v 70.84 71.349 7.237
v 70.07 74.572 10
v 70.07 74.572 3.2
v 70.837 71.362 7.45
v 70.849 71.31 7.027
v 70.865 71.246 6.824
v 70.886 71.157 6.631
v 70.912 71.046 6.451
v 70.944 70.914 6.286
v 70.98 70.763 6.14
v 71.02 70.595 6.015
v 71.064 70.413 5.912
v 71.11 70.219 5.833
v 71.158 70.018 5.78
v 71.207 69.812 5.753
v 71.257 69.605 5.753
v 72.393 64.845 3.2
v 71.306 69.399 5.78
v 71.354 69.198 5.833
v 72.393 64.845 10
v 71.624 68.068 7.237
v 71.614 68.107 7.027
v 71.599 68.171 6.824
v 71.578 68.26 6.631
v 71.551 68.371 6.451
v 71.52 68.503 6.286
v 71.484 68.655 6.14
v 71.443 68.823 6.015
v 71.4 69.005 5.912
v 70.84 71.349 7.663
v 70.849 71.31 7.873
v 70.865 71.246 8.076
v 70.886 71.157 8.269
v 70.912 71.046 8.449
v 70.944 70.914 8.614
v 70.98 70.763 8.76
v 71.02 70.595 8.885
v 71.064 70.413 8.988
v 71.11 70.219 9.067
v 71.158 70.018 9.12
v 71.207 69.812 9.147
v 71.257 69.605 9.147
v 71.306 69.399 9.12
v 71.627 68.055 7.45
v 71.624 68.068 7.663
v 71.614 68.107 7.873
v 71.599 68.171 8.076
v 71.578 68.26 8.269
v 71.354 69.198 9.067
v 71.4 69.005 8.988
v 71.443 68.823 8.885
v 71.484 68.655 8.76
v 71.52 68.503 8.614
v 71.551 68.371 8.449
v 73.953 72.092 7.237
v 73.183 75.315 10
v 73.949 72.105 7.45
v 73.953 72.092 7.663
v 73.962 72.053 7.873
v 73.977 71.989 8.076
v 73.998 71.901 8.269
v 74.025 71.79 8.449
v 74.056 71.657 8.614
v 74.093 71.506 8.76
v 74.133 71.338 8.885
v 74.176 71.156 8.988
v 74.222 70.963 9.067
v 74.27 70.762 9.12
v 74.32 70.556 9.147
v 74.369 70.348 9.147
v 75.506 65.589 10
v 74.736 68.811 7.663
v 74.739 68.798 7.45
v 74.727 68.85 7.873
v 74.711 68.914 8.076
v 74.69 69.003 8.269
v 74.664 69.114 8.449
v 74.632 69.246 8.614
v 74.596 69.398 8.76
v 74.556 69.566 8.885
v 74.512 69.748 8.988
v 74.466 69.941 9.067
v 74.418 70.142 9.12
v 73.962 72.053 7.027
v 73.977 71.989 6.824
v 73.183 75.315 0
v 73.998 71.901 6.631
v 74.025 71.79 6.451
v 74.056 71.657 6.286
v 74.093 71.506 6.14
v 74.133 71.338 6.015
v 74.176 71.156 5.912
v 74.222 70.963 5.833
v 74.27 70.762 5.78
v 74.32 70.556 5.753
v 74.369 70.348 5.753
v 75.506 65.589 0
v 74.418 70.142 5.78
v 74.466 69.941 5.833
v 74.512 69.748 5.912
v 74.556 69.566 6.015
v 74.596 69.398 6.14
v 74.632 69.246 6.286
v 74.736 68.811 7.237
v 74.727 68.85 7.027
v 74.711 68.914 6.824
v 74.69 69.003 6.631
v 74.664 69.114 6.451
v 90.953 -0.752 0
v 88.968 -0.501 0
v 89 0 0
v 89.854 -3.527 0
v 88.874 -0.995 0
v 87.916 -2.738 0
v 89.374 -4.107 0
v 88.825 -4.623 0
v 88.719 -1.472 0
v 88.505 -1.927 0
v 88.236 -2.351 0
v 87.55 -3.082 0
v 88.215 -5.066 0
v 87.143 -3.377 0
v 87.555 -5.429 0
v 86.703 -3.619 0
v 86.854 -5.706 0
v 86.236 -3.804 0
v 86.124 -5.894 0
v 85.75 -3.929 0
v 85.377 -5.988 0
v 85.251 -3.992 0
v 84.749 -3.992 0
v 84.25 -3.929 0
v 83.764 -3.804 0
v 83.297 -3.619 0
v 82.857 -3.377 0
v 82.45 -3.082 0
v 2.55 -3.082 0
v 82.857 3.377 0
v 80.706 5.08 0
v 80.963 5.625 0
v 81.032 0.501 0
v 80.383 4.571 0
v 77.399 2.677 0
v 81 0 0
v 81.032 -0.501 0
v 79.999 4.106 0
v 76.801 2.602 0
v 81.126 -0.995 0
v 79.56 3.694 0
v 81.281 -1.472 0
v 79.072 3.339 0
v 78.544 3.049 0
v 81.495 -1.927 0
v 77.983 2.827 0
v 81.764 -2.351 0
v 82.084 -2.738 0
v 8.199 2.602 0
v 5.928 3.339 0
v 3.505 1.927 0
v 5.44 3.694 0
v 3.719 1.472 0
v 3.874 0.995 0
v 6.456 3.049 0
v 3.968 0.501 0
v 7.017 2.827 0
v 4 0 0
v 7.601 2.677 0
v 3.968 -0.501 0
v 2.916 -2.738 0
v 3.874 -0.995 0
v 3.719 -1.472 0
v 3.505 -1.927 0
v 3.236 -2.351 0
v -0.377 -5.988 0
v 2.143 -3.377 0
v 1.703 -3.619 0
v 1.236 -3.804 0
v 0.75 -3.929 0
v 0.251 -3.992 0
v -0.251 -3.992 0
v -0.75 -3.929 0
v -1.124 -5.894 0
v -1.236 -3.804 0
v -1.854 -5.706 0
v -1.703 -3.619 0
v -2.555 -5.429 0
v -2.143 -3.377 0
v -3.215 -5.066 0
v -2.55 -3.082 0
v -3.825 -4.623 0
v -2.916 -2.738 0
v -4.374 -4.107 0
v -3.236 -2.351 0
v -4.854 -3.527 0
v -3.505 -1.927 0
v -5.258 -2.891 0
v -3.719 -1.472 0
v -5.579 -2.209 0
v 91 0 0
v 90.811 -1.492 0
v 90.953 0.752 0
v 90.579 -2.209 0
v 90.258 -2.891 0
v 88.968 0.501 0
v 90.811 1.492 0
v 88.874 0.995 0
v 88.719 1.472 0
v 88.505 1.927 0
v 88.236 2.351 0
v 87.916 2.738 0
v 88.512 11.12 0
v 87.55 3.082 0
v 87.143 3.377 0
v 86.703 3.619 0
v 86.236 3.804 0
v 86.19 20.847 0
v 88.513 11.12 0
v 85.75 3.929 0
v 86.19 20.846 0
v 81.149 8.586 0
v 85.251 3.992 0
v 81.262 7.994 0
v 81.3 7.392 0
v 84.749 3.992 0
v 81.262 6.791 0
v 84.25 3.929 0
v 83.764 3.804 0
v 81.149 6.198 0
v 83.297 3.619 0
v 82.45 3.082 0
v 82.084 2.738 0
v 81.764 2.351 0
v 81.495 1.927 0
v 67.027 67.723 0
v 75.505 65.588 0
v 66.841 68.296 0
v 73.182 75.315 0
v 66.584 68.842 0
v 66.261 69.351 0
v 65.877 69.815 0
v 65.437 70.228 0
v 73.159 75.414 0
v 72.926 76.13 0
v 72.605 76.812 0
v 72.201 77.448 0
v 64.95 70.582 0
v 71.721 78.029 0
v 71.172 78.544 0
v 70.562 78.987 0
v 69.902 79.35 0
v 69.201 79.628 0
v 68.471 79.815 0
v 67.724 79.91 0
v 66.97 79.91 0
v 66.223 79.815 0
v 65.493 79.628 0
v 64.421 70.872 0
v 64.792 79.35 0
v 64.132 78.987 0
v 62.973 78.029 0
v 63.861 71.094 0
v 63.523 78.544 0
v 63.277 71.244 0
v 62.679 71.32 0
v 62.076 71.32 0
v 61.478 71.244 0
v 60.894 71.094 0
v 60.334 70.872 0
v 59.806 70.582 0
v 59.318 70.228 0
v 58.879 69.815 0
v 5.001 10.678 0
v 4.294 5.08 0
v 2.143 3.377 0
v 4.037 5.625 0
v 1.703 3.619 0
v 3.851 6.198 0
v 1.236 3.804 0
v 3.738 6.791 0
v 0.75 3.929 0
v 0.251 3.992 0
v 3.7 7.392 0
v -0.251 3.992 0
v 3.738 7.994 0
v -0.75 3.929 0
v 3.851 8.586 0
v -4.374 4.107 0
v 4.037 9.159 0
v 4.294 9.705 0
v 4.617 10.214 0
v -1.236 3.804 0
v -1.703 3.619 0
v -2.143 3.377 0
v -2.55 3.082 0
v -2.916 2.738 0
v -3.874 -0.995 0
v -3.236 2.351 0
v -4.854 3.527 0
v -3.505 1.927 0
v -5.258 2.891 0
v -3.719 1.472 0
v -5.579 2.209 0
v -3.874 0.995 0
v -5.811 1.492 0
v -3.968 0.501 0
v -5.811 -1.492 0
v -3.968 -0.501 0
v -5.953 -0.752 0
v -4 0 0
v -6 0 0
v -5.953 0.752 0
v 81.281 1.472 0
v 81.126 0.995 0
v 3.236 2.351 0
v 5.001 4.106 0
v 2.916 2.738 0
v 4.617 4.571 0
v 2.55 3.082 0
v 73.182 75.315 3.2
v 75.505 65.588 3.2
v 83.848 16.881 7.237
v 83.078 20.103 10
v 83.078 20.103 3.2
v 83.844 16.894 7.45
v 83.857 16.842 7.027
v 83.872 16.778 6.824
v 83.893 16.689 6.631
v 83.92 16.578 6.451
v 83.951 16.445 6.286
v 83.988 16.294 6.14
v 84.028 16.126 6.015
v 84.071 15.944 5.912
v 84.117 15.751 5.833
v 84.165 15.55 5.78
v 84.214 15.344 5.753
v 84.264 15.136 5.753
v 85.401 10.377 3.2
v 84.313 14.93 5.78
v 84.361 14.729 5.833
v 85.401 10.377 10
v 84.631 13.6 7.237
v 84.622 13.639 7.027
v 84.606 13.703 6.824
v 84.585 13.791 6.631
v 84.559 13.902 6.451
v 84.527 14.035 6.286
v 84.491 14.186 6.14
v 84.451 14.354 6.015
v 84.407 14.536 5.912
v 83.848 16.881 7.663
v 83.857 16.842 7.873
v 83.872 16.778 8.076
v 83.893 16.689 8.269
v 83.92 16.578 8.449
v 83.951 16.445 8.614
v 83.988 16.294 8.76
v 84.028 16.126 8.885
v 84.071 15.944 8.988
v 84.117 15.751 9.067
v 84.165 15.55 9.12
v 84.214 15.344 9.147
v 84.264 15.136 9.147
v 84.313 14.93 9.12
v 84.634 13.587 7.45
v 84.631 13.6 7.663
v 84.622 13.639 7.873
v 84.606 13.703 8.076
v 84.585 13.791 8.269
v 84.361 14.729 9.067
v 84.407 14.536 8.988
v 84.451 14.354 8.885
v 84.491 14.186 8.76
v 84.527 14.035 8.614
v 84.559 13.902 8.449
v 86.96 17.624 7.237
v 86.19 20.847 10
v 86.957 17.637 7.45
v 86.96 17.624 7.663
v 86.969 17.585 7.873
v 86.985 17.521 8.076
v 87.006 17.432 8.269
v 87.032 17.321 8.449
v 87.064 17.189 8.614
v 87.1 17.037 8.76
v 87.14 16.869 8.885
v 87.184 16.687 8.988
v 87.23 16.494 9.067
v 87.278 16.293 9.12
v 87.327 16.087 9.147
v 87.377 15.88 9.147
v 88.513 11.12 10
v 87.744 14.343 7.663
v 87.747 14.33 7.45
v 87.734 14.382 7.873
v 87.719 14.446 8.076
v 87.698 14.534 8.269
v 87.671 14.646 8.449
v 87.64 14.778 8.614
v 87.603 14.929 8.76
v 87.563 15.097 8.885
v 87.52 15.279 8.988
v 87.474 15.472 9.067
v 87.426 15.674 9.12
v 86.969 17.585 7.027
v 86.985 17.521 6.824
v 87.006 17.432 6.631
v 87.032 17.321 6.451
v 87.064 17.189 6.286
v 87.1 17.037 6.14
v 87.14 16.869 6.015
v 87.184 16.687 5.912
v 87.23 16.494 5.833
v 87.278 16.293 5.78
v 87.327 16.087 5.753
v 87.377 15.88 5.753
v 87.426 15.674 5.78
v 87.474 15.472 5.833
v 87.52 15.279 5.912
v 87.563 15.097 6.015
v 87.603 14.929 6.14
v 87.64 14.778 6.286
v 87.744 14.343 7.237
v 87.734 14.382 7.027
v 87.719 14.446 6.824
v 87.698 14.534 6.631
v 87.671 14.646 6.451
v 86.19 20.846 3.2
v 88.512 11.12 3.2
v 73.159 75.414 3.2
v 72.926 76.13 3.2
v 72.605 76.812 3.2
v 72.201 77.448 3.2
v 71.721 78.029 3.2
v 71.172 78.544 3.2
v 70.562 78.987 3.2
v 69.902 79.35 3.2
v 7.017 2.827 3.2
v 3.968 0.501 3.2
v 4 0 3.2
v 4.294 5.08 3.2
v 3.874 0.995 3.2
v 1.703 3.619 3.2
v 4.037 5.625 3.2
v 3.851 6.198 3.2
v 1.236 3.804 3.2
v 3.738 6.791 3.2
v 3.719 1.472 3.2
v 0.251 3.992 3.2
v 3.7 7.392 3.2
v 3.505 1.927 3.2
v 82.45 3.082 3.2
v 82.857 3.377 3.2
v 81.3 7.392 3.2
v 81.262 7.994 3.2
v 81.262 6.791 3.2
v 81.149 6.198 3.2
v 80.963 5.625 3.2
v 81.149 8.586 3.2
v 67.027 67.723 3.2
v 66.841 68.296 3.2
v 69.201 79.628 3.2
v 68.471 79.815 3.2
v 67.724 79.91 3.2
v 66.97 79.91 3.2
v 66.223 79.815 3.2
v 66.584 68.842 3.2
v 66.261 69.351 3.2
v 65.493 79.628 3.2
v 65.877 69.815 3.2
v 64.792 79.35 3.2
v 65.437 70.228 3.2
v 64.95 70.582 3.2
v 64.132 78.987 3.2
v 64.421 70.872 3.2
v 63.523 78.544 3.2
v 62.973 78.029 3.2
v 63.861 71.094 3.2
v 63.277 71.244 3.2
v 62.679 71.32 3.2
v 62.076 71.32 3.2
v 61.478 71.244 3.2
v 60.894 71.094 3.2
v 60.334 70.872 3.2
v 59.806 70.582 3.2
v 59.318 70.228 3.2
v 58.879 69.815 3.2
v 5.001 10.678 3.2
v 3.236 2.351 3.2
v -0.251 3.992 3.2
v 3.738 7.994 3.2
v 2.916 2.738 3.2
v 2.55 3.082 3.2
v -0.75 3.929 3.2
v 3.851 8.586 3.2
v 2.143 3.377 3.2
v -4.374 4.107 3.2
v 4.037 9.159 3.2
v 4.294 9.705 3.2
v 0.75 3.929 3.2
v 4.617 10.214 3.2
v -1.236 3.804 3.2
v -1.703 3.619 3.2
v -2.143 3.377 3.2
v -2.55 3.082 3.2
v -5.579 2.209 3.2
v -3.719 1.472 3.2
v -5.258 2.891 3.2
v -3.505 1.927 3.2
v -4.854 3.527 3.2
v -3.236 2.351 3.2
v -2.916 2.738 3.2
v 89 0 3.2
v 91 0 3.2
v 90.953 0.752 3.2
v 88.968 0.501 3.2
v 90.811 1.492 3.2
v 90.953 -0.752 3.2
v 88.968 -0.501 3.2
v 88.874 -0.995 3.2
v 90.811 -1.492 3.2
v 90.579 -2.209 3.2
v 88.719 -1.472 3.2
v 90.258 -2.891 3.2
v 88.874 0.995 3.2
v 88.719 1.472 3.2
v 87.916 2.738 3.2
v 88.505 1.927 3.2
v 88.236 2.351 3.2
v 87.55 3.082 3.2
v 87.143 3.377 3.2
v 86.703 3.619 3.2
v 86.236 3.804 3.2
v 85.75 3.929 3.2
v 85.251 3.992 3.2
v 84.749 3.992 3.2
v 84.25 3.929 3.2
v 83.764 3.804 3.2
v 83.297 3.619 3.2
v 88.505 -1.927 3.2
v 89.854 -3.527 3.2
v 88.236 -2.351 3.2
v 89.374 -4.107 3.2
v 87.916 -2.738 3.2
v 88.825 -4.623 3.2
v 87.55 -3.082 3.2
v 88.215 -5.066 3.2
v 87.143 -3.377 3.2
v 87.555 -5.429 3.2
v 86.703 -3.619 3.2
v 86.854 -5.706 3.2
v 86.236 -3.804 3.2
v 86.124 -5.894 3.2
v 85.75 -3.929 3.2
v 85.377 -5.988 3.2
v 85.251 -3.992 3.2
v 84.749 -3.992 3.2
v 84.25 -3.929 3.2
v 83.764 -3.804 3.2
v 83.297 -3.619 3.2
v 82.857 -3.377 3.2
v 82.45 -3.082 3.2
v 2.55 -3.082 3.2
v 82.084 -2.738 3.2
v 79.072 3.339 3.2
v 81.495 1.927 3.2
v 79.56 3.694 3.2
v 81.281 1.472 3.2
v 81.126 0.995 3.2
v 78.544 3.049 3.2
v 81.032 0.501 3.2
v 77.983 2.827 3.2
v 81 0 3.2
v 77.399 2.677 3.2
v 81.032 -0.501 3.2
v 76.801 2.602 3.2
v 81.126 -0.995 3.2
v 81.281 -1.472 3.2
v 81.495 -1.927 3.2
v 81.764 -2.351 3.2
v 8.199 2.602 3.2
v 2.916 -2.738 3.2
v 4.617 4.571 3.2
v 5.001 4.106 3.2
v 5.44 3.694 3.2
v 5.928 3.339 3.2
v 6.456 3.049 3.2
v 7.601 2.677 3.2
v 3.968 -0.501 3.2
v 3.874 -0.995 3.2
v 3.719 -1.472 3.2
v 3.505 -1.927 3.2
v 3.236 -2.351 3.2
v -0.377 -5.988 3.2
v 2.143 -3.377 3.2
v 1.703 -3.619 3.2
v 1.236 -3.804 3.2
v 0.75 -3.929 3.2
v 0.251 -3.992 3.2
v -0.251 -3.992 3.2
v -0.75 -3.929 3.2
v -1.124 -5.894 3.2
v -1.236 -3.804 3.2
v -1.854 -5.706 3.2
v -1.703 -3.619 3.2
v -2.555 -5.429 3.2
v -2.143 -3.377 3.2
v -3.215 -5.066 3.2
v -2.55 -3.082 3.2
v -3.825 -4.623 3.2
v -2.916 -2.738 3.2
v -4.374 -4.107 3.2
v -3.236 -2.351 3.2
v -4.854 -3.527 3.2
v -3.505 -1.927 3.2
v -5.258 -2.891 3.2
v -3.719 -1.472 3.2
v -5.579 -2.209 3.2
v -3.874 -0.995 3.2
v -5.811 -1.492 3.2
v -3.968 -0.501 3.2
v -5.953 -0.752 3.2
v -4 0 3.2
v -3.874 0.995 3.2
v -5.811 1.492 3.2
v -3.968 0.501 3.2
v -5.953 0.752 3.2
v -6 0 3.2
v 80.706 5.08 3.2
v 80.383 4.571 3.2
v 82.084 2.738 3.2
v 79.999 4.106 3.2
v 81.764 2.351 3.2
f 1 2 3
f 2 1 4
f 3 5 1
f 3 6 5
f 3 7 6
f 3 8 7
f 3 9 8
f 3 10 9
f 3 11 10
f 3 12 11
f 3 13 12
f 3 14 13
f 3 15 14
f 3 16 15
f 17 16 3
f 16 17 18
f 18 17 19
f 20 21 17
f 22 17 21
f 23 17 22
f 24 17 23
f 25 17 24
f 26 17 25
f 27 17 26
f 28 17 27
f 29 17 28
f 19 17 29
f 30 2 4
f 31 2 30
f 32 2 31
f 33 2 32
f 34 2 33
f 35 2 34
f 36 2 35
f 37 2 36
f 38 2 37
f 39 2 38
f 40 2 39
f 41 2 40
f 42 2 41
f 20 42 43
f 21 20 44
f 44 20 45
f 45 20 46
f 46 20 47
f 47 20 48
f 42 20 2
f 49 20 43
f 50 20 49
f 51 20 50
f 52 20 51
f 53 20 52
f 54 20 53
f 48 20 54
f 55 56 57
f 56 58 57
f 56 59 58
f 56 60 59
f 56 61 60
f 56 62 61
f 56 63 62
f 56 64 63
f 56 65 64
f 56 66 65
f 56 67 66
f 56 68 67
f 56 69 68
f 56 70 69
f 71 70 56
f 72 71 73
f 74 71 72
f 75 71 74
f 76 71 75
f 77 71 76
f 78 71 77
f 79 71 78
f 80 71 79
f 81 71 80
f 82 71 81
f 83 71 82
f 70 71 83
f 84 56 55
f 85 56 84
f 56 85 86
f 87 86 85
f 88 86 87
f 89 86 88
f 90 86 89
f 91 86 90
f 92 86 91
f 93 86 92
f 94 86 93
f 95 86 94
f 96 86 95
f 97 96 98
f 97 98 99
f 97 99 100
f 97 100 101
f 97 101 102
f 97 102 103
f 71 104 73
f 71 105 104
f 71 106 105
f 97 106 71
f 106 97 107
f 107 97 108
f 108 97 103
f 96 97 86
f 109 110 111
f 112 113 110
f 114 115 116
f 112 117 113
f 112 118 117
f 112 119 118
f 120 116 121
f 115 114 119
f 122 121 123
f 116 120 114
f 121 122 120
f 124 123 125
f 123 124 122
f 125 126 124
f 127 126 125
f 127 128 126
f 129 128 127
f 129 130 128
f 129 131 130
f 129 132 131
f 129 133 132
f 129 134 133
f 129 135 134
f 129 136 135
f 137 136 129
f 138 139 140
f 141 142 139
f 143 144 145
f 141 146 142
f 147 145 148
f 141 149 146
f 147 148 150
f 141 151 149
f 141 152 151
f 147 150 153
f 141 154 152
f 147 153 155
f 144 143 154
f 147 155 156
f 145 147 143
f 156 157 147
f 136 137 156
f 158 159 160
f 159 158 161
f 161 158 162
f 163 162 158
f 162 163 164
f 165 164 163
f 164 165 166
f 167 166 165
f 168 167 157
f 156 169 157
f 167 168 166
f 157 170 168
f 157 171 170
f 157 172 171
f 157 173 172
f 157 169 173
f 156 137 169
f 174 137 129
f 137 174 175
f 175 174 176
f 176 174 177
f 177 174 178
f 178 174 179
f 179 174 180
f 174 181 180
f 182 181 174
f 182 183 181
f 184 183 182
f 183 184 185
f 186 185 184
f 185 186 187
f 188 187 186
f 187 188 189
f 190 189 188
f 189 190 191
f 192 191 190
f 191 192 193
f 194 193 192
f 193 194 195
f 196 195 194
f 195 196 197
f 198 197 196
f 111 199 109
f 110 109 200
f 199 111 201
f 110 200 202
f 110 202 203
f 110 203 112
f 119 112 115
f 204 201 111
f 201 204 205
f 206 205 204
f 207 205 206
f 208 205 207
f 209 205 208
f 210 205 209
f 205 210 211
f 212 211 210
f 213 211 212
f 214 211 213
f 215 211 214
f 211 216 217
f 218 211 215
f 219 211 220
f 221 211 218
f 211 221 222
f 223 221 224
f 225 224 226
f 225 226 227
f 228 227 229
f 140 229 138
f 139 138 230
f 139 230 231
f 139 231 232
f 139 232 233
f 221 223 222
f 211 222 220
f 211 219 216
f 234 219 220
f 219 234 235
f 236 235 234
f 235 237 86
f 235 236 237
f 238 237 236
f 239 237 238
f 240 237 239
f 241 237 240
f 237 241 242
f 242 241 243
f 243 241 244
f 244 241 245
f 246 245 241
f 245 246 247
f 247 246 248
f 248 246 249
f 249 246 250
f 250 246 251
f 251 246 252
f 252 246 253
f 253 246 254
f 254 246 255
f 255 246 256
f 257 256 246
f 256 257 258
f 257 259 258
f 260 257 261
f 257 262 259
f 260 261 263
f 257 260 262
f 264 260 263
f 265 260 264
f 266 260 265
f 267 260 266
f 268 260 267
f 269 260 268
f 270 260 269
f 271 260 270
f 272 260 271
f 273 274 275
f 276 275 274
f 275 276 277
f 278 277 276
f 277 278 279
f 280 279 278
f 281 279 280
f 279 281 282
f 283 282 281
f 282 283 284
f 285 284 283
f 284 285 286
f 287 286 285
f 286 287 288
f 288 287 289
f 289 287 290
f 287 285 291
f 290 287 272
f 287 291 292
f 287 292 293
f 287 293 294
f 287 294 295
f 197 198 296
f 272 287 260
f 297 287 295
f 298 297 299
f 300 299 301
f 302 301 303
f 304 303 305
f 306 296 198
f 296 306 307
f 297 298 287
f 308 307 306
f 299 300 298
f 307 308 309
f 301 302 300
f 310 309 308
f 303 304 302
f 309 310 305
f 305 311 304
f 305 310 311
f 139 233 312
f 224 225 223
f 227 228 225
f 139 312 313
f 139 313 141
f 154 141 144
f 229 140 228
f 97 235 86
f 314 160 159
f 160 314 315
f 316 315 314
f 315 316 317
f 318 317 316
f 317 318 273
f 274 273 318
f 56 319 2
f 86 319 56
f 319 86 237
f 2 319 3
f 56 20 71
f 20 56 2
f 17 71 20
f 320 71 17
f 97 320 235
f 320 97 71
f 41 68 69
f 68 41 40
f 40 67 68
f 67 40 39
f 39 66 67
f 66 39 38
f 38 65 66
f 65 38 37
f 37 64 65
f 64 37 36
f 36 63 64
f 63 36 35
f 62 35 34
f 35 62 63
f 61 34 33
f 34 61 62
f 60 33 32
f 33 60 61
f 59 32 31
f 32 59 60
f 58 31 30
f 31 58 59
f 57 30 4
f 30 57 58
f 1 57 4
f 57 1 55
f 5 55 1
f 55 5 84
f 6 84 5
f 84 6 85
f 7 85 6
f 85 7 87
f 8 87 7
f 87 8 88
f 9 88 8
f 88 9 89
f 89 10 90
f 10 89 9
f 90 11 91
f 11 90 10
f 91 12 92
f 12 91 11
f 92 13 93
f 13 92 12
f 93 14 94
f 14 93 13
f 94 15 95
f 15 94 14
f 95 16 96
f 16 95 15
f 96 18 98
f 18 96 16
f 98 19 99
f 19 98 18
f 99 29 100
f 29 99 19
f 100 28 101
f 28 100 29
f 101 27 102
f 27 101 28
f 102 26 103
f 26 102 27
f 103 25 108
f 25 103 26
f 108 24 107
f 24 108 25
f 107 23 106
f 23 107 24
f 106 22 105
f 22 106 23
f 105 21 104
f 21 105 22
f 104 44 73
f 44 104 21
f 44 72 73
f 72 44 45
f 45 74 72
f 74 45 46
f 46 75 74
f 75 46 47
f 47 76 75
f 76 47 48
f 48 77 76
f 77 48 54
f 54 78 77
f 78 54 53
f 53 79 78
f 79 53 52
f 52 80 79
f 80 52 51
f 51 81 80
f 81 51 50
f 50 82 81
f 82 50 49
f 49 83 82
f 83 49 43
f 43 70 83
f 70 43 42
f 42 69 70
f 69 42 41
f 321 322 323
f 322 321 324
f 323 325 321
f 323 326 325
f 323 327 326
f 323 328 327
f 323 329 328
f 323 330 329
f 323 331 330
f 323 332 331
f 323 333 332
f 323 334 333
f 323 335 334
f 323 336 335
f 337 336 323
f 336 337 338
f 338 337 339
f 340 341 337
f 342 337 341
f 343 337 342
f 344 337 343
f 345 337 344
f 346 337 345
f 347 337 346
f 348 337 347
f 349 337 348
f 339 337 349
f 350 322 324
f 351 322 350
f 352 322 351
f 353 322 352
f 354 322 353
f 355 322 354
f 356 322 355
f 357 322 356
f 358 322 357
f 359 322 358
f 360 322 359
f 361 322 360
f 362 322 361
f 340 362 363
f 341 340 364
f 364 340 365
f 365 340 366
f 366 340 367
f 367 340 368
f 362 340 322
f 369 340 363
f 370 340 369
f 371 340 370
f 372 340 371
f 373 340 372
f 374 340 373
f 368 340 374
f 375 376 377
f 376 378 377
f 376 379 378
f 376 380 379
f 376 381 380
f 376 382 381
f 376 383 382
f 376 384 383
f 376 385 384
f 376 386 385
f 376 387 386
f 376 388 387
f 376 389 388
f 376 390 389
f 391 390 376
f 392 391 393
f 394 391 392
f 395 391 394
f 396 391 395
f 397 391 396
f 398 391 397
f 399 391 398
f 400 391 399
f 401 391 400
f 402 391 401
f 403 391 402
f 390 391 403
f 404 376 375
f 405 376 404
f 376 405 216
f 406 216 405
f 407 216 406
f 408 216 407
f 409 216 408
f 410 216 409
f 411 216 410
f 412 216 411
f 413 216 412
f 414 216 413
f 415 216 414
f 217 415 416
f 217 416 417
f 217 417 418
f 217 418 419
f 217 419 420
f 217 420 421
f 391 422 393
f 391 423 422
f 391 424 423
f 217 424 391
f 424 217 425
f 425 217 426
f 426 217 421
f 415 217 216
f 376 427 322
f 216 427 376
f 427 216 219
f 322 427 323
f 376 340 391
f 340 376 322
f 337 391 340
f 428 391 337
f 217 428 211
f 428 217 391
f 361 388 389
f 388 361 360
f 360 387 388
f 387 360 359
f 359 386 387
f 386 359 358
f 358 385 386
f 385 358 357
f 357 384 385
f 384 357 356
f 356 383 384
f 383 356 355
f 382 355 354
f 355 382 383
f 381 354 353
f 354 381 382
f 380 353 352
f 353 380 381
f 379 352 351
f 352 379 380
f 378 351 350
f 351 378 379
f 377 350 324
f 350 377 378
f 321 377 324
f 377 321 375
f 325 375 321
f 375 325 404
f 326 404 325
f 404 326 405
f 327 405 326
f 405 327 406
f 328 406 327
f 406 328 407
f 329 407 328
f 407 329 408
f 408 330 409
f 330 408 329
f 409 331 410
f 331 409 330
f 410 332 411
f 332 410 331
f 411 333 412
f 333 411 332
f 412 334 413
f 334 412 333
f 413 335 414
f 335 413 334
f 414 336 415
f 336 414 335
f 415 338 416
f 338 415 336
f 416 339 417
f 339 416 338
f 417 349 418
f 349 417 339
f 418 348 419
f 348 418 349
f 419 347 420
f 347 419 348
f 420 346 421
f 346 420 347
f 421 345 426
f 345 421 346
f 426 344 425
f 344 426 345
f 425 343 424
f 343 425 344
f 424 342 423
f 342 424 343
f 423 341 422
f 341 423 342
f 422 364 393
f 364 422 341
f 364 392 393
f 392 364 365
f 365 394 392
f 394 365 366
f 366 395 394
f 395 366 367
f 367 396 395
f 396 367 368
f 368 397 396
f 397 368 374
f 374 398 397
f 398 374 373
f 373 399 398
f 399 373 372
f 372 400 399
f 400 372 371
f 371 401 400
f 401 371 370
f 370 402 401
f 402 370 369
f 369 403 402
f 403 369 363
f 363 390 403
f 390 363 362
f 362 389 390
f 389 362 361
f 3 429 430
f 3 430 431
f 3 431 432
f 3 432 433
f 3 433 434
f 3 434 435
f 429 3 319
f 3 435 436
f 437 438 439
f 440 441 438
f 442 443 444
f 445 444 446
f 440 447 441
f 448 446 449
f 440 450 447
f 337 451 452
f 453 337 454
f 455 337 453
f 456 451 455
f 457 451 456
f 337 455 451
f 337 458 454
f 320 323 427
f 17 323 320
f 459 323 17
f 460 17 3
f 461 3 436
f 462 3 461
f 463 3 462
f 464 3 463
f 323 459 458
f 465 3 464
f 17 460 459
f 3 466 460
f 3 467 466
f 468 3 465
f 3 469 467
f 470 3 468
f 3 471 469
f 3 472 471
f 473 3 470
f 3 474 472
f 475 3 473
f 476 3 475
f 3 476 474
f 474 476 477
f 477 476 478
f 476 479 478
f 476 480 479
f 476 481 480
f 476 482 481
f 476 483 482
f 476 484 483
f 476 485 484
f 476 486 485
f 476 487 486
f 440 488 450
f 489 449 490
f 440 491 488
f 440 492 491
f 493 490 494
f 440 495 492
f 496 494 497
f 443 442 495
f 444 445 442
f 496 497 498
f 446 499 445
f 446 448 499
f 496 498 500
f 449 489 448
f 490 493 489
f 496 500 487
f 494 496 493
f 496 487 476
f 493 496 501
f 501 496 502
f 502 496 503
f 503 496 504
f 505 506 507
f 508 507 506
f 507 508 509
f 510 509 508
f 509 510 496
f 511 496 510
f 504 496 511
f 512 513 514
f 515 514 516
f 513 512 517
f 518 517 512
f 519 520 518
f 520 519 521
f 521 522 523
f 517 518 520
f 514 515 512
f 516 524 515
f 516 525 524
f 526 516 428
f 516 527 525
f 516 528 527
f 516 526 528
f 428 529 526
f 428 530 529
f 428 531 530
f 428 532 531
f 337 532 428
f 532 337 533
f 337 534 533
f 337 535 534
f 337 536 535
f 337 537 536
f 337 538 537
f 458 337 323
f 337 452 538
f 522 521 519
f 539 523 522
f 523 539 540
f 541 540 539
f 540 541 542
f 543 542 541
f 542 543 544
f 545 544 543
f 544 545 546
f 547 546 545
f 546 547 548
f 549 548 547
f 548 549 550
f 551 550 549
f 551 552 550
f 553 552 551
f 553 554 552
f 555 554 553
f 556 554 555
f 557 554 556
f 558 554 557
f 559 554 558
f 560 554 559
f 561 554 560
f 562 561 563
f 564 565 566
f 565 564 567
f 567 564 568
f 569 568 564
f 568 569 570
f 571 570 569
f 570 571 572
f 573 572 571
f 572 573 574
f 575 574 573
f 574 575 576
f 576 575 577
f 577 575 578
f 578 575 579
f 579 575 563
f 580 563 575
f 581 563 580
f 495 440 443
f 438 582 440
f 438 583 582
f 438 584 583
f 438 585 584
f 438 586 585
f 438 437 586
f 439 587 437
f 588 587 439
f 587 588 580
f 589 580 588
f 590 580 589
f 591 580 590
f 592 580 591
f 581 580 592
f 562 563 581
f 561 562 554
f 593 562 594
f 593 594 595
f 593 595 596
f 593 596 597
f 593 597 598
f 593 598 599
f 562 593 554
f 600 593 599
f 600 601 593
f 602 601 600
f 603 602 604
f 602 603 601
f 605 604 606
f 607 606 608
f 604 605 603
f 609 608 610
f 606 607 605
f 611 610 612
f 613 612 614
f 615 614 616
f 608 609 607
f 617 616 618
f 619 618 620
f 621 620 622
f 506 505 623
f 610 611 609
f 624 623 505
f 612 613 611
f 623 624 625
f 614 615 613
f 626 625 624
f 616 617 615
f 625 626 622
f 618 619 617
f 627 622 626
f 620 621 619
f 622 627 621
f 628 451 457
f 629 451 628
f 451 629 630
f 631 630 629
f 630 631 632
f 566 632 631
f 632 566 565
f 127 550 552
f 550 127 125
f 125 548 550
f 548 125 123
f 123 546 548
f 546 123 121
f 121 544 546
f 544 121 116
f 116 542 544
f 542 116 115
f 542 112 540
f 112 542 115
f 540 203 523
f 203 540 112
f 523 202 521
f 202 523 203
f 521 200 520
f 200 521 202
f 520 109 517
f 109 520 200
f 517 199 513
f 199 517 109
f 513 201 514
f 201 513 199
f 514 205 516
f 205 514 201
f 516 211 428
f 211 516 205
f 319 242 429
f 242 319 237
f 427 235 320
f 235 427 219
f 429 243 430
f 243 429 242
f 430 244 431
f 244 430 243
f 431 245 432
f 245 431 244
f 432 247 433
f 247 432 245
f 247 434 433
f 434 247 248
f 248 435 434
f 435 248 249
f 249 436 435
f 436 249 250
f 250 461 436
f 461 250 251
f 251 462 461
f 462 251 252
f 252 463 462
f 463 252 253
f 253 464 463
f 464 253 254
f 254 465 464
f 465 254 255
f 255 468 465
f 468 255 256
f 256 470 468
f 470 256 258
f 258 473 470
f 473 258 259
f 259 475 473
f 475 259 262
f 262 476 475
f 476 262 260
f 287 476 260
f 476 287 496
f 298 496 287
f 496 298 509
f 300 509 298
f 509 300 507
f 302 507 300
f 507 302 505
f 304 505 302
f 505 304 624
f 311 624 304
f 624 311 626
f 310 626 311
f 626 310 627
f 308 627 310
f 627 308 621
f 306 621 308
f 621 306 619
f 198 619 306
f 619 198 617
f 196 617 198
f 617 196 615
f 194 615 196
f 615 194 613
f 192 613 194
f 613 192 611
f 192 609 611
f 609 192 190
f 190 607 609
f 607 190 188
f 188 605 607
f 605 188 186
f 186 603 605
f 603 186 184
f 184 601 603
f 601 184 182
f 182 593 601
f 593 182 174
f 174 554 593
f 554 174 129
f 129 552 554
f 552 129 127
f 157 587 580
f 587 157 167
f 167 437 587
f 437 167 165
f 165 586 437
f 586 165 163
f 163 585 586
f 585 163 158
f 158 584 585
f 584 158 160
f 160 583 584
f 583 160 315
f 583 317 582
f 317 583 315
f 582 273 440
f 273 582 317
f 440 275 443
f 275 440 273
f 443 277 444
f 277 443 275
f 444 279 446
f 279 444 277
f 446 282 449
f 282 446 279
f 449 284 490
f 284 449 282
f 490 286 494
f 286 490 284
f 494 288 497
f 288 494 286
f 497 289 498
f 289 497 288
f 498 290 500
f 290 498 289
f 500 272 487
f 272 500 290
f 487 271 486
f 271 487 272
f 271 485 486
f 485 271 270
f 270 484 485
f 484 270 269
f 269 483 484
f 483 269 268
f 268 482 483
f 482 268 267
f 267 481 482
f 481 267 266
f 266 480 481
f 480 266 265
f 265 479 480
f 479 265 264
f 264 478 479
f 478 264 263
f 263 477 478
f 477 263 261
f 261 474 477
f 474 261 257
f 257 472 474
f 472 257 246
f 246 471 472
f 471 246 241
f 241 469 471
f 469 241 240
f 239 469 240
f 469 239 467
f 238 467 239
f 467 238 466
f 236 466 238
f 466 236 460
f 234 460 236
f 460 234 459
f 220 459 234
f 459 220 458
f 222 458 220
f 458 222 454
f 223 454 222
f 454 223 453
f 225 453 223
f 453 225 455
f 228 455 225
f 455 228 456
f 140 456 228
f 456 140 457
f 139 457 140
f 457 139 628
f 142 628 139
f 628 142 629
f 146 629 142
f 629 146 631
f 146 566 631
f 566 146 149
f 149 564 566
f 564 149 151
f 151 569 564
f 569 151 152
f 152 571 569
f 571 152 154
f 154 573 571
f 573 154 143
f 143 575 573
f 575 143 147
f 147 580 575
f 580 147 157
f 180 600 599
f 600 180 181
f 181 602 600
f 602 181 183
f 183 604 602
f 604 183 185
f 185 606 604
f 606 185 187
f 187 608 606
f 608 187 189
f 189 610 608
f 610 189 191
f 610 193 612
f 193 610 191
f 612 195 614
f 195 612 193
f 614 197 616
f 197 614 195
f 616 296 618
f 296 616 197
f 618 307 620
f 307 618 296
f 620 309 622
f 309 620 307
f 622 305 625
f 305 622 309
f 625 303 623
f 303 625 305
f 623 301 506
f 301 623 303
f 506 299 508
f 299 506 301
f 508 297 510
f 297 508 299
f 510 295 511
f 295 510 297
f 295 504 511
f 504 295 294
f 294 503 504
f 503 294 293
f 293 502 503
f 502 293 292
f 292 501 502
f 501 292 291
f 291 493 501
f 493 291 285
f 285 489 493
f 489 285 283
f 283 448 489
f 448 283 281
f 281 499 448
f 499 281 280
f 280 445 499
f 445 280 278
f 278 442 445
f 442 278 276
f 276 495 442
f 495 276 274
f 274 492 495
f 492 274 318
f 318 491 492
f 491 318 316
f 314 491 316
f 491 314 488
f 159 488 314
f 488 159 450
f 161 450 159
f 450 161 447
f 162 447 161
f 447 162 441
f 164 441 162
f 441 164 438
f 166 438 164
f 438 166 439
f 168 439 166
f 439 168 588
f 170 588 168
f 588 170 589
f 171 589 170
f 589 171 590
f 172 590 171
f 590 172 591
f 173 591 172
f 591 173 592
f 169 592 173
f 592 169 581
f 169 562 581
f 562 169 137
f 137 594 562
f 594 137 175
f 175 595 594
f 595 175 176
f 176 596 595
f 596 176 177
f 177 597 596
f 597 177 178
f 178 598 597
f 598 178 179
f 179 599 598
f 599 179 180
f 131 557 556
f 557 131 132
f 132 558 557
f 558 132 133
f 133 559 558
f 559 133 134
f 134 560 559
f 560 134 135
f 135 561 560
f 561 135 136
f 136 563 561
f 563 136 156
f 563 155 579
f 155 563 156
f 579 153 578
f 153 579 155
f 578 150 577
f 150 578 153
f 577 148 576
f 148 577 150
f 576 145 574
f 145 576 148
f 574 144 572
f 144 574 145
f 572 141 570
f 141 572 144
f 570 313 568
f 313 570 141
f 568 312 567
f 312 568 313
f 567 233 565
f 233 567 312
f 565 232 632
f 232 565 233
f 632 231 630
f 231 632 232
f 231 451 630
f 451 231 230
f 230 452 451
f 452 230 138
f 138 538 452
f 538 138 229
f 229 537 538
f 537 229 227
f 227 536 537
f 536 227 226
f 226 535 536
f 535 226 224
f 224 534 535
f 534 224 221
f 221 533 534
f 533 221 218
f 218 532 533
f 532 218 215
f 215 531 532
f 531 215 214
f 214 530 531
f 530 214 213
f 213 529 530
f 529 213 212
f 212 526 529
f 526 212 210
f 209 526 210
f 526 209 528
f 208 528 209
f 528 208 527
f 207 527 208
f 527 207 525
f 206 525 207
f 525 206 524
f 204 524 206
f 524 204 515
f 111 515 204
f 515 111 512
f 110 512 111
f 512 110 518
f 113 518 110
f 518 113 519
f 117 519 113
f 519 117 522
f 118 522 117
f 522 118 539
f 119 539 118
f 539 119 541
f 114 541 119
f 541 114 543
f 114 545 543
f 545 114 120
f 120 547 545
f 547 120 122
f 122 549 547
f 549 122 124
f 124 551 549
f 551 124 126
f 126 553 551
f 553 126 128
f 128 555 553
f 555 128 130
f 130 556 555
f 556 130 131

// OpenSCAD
$fn = 50;

r1 = 8/2; // big mounting holes
r2 = 3.4/2; // PCB mounting hols
a = 85; // distance between large mounting holes (centers)
b = 100; // lift arm of the bracket, sets the angle of the bracket
d = 56; // distance between PCB mounting holes (centers)
c = d+20; // extra size for the PCB mount part of the bracket

tab_size = 10;  // square tab size

thickness = 3.2; // thickness of the bracket and tabs
sc = 0.8; // center removal scale factor
mink = 1.5; // r1*mink(owski) produces the rounded edges and the hole material

union()
{
	linear_extrude(height = thickness) difference()
	{
		minkowski()
		{
			polygon(points = [[0,0], [a,0], [b*cos(acos((pow(a,2)+pow(b,2)-pow(c,2))/(2*a*b))), b*sin(acos((pow(a,2)+pow(b,2)-pow(c,2))/(2*a*b)))]], paths = [[0,1,2,0]]);
			circle(r = mink*r1);
		}

		circle(r = r1);
		translate([a,0]) circle(r = r1);
		
		translate([a/2-(a/2)*sc,b*sin(acos((pow(a,2)+pow(b,2)-pow(c,2))/(2*a*b)))/2-(b*sin(acos((pow(a,2)+pow(b,2)-pow(c,2))/(2*a*b)))/2)*sc]) scale(v = [sc,sc]) minkowski()
		{
			polygon(points = [[0,0], [a,0], [b*cos(acos((pow(a,2)+pow(b,2)-pow(c,2))/(2*a*b))), b*sin(acos((pow(a,2)+pow(b,2)-pow(c,2))/(2*a*b)))]], paths = [[0,1,2,0]]);
			circle(r = mink*r1);
		}
	}

	//translate([tab_size/2+mink*r1, tab_size/2+mink*r1,0])
	translate([b*cos(acos((pow(a,2)+pow(b,2)-pow(c,2))/(2*a*b))), b*sin(acos((pow(a,2)+pow(b,2)-pow(c,2))/(2*a*b)))]) rotate([0,0,-acos((pow(a,2)+pow(c,2)-pow(b,2))/(2*a*c))]) translate([tab_size/2, mink*r1-thickness, tab_size/2]) rotate([-90,0,0]) union()
	{
		linear_extrude(height = thickness) difference()
		{
			square([tab_size, tab_size], center = true);
			translate([0,-tab_size/2+r2*mink]) circle(r = r2);
		}

		translate([d,0]) linear_extrude(height = thickness) difference()
		{
			square([tab_size, tab_size], center = true);
			translate([0,-tab_size/2+r2*mink]) circle(r = r2);
		}
	}
}
